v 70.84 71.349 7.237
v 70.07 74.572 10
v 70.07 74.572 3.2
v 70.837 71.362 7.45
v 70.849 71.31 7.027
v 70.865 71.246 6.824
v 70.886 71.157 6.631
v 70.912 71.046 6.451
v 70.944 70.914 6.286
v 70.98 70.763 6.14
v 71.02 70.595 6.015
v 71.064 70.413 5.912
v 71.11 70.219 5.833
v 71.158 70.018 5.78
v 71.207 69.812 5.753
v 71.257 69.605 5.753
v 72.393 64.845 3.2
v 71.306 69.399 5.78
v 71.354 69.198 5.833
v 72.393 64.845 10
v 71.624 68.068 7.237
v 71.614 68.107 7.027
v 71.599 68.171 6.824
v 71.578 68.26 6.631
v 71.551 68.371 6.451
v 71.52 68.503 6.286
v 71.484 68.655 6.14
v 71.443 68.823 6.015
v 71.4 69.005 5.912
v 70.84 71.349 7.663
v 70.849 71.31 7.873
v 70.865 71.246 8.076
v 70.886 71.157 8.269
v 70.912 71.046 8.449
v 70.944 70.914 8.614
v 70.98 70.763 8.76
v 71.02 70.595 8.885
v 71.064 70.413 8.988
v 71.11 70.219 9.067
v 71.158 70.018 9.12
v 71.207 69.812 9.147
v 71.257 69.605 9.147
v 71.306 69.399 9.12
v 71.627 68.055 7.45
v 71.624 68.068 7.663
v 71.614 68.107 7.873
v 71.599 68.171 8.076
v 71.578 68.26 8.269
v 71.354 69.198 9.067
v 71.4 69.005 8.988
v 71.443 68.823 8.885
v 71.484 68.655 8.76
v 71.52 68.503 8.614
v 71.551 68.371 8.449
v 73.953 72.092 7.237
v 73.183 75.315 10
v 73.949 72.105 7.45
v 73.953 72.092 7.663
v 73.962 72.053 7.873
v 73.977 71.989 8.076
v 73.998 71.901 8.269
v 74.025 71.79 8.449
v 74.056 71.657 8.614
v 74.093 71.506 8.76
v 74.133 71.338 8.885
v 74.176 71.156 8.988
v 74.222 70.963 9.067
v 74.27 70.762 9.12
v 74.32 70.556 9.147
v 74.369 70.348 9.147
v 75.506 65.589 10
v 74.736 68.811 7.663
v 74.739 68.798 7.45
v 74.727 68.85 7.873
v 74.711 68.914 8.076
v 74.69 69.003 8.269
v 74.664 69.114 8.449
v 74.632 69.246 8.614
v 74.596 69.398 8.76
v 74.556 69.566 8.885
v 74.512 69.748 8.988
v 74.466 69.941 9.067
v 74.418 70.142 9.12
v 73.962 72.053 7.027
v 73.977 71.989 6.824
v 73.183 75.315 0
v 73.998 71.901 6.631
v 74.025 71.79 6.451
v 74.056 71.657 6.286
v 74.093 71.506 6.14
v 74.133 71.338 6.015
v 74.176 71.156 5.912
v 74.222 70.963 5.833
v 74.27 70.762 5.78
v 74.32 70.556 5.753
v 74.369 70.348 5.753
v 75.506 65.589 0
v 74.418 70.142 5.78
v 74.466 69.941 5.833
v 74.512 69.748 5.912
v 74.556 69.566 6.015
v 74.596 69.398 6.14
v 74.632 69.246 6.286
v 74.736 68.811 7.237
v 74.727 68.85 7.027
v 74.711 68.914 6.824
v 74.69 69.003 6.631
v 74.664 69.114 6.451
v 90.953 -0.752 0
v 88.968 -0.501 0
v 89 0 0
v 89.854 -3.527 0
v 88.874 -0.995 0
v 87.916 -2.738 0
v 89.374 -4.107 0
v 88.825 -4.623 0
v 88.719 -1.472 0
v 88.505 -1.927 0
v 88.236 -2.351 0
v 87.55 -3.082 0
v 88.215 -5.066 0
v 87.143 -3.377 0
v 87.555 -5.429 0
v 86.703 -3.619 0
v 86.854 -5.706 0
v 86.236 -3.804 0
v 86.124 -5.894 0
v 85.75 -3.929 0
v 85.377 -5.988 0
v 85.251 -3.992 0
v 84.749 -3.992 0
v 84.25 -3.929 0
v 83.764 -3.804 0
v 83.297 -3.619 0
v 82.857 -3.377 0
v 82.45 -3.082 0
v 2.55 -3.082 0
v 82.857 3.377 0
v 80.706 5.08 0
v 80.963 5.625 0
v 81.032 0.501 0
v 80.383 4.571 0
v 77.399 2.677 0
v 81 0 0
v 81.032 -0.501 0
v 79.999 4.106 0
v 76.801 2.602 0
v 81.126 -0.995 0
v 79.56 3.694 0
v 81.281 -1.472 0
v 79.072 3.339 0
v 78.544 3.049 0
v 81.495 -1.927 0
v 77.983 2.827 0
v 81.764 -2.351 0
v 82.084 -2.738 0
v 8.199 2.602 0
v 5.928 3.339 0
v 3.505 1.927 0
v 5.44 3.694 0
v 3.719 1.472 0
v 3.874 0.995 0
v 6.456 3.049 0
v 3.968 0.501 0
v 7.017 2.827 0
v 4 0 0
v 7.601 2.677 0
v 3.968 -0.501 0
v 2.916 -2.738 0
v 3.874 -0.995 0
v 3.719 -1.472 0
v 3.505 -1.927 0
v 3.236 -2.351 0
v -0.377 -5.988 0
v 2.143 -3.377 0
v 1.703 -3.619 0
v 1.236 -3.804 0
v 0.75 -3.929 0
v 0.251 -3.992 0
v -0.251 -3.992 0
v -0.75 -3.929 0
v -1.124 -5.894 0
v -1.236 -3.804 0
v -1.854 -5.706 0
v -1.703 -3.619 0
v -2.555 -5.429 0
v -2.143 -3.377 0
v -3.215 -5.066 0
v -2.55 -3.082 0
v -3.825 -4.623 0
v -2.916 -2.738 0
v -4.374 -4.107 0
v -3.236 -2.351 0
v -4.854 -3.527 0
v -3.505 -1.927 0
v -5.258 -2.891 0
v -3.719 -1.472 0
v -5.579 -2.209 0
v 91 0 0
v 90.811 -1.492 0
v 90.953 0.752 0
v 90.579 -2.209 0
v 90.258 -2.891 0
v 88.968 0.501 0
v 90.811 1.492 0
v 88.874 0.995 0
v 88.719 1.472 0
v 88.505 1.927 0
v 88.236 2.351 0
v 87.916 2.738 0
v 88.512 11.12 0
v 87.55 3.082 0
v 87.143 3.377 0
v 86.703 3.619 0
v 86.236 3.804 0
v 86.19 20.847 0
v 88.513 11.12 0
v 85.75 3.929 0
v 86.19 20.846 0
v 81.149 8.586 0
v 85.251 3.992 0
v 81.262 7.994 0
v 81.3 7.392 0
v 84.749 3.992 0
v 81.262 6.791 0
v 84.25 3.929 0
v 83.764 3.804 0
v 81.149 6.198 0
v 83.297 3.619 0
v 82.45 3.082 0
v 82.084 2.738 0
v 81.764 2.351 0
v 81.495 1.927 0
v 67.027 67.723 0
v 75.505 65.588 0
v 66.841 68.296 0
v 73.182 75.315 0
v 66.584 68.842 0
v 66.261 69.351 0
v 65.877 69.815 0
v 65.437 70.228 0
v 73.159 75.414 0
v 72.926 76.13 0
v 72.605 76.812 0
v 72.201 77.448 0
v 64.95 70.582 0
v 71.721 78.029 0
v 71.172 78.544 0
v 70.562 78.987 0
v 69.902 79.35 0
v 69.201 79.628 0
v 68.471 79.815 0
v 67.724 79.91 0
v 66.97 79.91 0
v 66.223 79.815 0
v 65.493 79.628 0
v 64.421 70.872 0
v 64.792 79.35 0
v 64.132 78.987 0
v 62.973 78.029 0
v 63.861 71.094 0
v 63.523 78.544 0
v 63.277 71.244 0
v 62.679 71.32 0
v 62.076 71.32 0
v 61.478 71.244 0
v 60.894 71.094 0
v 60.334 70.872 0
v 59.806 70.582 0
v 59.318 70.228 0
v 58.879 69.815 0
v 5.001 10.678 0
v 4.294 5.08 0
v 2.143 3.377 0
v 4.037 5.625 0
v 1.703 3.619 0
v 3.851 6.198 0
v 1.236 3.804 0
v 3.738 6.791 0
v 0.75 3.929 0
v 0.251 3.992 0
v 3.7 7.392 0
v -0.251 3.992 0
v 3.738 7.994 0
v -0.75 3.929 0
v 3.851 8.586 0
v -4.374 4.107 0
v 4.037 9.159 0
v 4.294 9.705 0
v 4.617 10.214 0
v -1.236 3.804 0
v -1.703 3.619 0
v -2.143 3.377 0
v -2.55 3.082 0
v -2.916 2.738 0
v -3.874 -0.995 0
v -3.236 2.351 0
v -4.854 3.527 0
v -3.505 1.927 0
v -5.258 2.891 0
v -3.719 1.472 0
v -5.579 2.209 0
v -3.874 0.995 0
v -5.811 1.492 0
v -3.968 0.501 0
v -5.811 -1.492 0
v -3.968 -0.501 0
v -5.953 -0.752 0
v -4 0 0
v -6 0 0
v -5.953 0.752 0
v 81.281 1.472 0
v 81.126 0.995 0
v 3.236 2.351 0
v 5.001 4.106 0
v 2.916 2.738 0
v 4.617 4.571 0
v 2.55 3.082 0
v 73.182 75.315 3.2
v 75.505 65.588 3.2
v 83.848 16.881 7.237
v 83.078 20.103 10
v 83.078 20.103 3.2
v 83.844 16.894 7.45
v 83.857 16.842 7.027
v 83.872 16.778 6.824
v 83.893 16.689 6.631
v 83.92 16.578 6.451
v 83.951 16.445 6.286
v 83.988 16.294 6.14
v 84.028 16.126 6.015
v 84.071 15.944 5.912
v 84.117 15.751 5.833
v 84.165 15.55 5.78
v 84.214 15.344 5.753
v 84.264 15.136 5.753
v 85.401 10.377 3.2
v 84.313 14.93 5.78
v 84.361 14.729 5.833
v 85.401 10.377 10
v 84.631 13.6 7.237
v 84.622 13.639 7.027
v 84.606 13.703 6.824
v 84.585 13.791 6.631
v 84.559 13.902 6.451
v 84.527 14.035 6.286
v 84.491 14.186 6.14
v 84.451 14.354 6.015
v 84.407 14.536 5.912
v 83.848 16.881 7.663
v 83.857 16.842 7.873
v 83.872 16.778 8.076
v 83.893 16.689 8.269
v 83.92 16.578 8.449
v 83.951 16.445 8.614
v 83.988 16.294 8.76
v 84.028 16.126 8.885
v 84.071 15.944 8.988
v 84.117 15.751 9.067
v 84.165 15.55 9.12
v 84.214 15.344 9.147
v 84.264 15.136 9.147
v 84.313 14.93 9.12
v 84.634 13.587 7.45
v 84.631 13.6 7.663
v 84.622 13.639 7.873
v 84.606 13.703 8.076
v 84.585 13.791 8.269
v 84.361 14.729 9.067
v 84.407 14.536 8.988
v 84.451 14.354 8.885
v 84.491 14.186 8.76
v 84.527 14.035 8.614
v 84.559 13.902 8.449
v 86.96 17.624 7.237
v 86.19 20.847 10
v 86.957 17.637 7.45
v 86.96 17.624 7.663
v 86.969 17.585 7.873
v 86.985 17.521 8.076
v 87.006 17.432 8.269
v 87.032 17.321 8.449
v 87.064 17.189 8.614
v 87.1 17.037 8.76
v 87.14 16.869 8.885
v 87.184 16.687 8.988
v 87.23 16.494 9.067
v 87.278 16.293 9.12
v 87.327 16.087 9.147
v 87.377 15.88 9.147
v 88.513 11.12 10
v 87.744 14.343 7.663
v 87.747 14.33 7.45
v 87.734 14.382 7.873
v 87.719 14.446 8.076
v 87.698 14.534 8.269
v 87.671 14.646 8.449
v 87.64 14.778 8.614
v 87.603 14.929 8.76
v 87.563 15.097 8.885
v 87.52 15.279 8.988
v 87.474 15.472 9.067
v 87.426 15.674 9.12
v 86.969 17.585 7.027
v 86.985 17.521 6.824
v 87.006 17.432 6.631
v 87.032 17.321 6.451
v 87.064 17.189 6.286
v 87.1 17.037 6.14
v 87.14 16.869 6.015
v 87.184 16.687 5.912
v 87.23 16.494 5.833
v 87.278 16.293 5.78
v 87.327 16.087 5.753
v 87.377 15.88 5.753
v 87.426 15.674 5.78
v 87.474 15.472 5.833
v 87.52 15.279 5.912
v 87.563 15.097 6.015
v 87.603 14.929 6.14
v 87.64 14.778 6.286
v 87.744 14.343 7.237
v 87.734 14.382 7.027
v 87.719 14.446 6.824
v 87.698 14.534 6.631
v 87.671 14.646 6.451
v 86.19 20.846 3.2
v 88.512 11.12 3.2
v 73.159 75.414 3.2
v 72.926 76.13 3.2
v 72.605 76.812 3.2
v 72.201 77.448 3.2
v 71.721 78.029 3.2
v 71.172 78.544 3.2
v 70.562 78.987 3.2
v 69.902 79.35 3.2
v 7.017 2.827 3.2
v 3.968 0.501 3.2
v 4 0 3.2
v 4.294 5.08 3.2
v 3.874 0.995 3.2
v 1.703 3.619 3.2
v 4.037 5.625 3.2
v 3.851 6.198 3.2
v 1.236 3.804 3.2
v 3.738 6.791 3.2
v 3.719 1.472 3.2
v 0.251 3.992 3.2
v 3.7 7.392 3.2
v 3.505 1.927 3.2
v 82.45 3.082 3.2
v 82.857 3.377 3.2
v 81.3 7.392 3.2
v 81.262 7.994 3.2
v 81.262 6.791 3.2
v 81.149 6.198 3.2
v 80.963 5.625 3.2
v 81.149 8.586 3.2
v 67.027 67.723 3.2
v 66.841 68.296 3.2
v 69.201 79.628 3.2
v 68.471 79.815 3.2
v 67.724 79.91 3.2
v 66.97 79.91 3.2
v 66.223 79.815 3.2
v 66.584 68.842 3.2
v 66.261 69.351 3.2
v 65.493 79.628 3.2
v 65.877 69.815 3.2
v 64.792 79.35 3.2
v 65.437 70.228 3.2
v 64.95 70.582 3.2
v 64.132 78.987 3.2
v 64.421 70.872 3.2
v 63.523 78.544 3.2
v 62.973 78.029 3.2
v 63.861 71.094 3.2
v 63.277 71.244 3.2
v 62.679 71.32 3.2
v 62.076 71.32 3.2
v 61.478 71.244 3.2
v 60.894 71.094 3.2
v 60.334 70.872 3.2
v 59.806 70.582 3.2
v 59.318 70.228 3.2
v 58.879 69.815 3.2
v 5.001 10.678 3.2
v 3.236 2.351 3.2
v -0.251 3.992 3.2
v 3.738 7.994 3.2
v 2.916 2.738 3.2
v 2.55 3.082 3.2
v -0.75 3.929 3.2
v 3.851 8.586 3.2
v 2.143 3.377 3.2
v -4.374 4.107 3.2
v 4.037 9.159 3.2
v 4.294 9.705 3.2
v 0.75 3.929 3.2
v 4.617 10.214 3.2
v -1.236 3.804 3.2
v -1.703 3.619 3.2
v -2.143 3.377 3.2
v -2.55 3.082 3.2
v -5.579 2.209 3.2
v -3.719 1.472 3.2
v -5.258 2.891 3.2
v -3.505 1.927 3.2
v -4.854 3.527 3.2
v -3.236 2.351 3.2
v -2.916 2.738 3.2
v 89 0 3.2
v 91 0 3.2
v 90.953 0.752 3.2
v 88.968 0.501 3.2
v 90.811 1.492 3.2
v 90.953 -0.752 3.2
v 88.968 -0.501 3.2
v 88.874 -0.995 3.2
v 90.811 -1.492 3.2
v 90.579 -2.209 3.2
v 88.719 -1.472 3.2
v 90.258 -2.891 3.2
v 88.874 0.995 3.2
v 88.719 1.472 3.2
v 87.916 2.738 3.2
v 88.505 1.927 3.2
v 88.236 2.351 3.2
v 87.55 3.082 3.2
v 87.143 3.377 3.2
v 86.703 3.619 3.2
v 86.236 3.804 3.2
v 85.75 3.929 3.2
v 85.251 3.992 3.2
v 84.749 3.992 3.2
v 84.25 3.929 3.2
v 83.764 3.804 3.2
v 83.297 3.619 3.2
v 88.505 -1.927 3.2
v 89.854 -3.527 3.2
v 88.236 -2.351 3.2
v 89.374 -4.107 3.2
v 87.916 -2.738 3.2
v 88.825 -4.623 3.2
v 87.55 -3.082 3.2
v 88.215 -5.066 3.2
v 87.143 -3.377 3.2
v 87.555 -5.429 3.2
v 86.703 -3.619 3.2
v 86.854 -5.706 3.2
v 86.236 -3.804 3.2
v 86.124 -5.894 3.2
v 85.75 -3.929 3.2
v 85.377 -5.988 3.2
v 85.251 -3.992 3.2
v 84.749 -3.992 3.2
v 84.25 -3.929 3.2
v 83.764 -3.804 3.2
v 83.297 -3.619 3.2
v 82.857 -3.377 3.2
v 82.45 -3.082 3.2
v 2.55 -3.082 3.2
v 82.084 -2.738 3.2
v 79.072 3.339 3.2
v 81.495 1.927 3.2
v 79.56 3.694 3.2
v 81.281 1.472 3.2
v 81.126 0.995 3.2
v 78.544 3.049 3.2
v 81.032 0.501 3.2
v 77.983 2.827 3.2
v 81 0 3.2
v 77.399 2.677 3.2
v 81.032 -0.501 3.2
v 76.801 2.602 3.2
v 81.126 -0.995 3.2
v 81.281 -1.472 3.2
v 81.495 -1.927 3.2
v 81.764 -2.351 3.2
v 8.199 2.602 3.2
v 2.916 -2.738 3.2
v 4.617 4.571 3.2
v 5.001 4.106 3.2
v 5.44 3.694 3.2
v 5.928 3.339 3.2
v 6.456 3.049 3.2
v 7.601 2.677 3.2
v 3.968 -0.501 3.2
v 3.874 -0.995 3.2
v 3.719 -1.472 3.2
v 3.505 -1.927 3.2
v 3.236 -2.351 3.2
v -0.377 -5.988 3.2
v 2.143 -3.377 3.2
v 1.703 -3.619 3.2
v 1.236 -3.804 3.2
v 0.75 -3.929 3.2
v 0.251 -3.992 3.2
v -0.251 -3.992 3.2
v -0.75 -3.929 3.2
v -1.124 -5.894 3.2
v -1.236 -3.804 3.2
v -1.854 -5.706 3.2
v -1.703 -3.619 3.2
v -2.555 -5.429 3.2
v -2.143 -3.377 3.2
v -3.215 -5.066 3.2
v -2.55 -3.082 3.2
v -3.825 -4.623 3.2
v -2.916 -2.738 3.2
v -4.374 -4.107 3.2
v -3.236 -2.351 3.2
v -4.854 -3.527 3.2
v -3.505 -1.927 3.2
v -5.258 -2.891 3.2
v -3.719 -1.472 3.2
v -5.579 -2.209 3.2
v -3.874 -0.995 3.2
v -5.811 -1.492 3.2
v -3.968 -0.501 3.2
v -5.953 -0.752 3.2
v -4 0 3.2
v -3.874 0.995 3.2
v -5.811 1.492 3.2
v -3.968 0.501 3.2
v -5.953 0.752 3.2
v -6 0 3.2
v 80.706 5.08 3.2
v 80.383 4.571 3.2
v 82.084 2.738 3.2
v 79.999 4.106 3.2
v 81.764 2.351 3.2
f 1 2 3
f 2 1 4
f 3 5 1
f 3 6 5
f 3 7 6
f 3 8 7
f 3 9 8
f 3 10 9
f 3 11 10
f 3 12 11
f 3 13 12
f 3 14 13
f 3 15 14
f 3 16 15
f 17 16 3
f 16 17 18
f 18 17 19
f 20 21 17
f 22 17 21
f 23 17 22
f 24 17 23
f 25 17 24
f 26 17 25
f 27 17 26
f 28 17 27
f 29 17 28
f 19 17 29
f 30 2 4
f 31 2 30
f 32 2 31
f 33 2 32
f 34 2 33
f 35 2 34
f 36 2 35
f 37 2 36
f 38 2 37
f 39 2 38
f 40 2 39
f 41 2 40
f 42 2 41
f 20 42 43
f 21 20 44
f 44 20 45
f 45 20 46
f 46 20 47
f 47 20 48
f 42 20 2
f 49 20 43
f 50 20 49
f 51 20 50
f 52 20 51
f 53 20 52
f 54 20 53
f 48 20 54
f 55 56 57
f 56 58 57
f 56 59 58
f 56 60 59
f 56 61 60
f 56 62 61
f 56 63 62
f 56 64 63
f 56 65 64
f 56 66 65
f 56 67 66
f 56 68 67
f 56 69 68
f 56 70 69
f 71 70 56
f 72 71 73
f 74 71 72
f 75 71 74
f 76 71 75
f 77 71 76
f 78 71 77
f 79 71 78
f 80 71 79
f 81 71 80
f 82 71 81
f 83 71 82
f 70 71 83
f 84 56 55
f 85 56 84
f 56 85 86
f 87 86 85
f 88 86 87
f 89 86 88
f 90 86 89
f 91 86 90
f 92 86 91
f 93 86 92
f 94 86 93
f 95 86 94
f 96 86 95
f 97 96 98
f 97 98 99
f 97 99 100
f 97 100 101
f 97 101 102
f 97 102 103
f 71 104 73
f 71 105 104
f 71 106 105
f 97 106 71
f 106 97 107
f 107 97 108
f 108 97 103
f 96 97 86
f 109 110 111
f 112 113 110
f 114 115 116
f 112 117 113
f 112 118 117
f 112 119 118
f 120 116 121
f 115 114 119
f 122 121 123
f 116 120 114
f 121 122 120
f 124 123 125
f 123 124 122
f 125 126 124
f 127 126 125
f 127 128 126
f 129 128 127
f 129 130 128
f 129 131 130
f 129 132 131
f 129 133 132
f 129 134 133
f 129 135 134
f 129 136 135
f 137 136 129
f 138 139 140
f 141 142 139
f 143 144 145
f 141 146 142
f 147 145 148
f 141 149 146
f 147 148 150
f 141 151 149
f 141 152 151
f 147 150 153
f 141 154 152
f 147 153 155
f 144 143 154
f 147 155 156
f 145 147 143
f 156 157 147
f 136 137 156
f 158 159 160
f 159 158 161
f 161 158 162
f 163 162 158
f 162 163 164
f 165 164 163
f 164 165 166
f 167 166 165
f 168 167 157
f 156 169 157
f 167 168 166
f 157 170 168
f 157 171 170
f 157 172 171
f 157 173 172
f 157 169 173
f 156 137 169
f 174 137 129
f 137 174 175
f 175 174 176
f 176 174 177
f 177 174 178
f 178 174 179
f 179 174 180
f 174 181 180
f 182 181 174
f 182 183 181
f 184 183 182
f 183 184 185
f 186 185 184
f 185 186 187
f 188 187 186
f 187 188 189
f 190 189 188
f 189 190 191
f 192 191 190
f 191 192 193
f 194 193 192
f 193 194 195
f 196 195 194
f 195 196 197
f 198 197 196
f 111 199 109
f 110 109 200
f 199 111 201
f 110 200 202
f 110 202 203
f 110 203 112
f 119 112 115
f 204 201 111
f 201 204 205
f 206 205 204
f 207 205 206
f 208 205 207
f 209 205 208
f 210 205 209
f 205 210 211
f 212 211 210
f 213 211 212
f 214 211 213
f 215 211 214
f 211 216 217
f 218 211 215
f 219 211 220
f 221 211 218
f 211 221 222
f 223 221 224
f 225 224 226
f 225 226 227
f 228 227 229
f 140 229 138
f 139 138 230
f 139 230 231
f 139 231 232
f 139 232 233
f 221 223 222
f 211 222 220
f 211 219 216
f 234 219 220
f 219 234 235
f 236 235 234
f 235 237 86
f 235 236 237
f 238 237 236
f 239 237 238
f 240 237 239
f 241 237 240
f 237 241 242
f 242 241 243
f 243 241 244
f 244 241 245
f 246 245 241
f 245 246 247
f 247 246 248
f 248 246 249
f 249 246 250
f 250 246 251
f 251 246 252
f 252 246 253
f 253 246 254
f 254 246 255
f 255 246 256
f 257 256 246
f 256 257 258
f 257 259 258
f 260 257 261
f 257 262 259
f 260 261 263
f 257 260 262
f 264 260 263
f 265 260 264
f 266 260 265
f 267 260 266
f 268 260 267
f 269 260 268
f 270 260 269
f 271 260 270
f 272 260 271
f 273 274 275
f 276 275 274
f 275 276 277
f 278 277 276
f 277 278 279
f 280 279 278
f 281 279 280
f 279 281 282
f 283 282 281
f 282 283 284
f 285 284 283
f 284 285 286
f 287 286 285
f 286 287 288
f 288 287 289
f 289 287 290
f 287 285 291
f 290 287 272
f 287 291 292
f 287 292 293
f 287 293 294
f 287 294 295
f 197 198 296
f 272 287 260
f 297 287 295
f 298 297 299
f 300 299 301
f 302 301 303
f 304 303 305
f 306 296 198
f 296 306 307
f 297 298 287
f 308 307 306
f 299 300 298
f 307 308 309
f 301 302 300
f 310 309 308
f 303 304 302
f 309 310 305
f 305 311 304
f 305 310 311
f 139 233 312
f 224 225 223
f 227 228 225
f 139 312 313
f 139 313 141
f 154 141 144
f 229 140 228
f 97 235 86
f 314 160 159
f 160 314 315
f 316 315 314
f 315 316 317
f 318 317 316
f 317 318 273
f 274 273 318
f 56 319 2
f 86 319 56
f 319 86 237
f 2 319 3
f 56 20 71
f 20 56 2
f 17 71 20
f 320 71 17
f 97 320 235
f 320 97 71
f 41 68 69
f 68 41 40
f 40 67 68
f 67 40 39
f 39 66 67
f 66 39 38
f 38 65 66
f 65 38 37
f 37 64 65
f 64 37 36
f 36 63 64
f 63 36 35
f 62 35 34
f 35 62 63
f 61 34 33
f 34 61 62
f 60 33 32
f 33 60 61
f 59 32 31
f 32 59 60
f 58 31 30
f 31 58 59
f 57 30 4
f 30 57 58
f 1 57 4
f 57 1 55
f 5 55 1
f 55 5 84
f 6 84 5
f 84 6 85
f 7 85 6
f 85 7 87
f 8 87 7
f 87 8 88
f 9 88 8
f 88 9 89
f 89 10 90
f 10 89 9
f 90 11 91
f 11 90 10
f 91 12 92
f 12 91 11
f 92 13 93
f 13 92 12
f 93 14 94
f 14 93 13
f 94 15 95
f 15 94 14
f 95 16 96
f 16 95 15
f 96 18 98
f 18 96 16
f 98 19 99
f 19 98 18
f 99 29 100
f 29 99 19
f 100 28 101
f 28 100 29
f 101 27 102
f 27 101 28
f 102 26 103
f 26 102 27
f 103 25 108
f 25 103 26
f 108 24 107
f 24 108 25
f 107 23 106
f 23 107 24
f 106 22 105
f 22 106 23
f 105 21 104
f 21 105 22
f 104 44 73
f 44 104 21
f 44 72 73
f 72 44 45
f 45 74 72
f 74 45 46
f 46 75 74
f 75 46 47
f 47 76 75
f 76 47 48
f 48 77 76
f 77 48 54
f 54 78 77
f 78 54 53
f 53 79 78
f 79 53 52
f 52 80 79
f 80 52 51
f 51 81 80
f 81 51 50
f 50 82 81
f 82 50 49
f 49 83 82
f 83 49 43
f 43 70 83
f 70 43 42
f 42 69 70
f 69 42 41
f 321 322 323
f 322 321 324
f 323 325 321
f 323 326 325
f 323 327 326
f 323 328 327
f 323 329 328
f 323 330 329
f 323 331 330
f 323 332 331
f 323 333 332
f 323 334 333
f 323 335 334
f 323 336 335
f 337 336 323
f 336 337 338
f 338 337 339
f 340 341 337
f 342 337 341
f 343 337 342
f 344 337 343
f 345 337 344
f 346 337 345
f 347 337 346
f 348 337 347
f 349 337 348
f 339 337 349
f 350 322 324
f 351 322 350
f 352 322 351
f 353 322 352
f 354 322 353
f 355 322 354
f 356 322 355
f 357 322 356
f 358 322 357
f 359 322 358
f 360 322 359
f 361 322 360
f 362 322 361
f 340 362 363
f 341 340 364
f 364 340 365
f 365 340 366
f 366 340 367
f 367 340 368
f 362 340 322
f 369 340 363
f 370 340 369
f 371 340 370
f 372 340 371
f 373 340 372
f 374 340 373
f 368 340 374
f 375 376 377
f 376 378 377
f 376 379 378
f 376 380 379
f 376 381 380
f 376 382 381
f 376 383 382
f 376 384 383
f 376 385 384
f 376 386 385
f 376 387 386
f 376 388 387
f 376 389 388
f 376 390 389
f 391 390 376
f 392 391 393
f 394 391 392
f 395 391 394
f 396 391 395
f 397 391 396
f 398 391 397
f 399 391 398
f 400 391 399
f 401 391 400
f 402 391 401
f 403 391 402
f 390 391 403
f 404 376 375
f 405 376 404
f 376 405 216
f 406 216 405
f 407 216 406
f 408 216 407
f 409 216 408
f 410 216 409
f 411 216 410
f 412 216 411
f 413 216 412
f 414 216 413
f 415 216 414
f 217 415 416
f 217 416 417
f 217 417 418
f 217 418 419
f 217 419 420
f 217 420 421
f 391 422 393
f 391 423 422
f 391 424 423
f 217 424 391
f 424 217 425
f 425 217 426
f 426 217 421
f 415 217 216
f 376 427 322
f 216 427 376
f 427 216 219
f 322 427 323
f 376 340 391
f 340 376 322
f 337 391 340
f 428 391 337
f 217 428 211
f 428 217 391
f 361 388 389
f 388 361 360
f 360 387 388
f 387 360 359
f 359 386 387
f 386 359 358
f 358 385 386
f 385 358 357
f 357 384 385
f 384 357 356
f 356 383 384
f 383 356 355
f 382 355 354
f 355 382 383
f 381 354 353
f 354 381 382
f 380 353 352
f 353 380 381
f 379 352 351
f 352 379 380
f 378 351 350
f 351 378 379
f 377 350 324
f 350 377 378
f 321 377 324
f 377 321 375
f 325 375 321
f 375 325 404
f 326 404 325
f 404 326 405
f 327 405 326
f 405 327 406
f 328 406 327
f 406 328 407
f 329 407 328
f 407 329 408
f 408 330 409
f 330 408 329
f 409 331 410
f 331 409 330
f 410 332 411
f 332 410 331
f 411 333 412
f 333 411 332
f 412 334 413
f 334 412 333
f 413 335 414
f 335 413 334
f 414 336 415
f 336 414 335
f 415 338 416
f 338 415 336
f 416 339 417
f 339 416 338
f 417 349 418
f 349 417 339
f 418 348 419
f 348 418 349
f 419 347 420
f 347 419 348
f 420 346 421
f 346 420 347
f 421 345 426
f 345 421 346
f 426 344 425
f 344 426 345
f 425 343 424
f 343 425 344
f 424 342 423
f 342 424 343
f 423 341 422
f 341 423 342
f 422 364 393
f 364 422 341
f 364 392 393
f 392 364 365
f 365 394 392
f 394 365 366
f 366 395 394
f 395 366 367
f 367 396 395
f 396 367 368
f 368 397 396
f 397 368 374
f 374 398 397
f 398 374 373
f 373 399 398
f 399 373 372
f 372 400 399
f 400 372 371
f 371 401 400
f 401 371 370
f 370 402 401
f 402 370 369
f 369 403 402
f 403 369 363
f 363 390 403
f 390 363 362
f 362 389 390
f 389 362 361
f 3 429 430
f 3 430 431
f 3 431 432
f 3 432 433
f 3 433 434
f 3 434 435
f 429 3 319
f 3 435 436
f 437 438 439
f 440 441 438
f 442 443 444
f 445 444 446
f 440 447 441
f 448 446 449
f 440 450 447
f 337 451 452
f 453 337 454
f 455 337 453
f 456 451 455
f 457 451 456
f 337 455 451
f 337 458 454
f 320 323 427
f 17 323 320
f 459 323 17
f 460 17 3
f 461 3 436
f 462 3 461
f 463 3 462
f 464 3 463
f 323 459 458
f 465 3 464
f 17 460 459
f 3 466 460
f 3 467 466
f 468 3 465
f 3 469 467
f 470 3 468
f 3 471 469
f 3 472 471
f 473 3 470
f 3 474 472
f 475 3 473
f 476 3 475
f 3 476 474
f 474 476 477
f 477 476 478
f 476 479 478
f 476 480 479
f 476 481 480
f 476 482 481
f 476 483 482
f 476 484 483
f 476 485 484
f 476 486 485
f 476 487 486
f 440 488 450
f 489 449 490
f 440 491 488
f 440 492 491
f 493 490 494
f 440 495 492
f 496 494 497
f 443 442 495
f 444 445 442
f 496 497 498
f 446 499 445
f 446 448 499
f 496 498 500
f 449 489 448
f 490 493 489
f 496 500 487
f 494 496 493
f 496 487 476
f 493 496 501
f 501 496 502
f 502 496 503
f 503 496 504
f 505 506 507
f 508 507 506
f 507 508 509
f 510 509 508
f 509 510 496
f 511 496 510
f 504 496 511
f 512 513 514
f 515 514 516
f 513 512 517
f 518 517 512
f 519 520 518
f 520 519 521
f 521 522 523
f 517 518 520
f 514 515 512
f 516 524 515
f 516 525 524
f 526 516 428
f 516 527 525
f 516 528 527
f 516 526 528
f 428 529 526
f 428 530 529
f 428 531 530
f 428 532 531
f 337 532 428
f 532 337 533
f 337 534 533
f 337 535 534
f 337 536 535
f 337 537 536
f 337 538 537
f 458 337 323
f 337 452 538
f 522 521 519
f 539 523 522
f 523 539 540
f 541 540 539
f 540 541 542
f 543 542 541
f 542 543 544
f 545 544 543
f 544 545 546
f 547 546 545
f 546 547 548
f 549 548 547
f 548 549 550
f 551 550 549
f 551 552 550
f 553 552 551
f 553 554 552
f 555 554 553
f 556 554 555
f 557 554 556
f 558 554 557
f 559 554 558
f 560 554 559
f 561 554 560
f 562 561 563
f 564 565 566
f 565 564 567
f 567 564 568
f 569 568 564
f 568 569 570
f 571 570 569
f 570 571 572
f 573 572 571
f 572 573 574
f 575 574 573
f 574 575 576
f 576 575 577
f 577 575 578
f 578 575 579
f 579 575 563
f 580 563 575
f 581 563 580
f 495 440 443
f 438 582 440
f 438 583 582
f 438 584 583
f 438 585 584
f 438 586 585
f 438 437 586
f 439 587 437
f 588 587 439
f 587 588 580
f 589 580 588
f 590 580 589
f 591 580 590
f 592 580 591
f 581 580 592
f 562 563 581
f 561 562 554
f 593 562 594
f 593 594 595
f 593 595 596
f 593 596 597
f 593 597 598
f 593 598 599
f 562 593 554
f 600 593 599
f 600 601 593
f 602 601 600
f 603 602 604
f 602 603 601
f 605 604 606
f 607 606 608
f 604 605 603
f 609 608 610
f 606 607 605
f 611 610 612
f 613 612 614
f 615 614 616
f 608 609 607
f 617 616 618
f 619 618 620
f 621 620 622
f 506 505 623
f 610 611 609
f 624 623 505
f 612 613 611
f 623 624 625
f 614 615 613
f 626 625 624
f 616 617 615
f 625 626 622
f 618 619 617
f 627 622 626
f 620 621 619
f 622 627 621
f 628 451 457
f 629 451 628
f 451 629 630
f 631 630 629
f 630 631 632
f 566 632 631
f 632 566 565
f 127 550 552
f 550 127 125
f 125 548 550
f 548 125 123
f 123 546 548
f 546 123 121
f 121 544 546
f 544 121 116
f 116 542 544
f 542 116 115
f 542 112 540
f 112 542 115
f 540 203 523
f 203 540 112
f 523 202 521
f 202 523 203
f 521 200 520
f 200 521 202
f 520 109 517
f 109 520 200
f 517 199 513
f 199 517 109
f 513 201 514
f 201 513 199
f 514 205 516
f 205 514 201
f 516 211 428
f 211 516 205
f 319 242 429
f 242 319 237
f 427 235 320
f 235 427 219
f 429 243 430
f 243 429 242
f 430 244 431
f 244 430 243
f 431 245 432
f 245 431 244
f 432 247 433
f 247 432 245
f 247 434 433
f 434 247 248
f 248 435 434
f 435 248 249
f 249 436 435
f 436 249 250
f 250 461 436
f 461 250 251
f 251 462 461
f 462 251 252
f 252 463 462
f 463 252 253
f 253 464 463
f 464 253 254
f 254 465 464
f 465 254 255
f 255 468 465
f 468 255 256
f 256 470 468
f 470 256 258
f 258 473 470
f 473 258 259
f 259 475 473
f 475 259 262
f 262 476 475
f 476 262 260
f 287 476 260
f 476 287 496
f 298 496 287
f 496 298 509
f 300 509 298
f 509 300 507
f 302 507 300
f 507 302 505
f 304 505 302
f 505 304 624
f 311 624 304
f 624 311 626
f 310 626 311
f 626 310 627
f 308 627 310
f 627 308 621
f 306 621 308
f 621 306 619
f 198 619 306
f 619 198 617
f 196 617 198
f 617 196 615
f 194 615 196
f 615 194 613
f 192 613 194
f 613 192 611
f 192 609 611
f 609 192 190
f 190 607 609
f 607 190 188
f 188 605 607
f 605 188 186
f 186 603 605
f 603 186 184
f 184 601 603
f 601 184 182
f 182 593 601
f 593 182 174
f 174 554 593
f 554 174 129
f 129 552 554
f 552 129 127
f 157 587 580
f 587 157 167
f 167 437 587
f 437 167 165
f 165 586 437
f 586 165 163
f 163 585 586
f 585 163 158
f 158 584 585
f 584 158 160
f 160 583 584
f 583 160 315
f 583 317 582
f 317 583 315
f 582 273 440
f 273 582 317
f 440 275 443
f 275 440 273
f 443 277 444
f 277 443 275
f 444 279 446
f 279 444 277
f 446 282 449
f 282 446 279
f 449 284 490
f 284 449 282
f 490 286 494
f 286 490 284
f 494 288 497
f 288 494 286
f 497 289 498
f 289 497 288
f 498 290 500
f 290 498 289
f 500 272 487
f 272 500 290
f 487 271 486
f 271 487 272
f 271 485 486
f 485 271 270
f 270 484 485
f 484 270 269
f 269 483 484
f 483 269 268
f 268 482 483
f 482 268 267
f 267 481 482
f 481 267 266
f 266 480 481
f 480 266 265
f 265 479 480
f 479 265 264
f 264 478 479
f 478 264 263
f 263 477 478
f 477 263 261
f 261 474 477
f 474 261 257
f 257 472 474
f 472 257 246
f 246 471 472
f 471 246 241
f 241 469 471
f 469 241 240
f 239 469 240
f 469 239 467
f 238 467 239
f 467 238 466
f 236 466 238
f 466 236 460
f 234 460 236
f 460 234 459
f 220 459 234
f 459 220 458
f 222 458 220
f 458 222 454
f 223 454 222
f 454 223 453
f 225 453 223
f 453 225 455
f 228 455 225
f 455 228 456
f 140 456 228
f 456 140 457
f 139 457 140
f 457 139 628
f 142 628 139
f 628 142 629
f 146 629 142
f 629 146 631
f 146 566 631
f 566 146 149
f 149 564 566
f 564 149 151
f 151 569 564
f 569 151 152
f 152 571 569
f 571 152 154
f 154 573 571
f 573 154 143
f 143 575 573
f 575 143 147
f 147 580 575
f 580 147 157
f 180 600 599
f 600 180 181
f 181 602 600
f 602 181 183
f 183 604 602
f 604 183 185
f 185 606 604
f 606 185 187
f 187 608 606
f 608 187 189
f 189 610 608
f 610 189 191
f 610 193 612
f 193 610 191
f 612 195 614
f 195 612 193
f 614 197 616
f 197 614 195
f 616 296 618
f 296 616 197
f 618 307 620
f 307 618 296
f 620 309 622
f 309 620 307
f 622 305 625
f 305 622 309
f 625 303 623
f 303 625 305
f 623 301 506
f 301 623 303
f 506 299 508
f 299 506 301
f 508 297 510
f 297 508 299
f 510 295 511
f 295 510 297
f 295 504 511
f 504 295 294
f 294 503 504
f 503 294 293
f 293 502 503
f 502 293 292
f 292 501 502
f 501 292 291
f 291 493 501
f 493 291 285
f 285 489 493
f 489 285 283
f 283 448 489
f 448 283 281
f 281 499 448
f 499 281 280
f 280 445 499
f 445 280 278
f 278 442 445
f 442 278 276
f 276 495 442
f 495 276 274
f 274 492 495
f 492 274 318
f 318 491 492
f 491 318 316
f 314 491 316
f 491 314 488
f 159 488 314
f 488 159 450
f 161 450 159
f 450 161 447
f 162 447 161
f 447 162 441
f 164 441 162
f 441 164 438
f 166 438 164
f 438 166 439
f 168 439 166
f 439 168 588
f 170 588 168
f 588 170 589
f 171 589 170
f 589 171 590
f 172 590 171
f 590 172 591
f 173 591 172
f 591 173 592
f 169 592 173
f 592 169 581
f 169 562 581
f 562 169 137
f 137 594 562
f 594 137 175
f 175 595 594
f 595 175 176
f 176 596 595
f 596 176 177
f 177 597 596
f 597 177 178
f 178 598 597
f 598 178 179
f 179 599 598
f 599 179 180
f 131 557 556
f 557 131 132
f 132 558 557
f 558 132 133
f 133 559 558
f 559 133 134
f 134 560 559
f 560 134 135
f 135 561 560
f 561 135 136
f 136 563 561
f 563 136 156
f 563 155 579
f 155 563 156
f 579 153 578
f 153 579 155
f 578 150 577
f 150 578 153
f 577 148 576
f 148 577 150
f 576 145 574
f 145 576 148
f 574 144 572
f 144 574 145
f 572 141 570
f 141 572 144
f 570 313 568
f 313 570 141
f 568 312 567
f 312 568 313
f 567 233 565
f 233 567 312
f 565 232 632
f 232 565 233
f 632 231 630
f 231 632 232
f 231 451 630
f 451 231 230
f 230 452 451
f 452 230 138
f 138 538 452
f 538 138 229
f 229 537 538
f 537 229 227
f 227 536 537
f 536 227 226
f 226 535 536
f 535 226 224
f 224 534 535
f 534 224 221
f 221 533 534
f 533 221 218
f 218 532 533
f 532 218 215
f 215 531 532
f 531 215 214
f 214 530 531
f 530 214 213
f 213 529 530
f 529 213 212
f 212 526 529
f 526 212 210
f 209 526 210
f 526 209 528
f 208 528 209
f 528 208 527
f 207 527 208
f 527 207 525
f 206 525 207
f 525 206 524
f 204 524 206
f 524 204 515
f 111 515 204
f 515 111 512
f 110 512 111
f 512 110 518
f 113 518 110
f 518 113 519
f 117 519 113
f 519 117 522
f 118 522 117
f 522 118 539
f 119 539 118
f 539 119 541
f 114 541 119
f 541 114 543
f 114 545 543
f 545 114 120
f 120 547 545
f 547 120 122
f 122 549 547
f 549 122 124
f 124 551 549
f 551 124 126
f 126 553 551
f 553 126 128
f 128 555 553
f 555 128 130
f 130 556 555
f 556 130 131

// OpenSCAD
$fn = 50;

r1 = 8/2; // big mounting holes
r2 = 3.4/2; // PCB mounting hols
a = 85; // distance between large mounting holes (centers)
b = 100; // lift arm of the bracket, sets the angle of the bracket
d = 56; // distance between PCB mounting holes (centers)
c = d+20; // extra size for the PCB mount part of the bracket

tab_size = 10;  // square tab size

thickness = 3.2; // thickness of the bracket and tabs
sc = 0.8; // center removal scale factor
mink = 1.5; // r1*mink(owski) produces the rounded edges and the hole material

union()
{
	linear_extrude(height = thickness) difference()
	{
		minkowski()
		{
			polygon(points = [[0,0], [a,0], [b*cos(acos((pow(a,2)+pow(b,2)-pow(c,2))/(2*a*b))), b*sin(acos((pow(a,2)+pow(b,2)-pow(c,2))/(2*a*b)))]], paths = [[0,1,2,0]]);
			circle(r = mink*r1);
		}

		circle(r = r1);
		translate([a,0]) circle(r = r1);
		
		translate([a/2-(a/2)*sc,b*sin(acos((pow(a,2)+pow(b,2)-pow(c,2))/(2*a*b)))/2-(b*sin(acos((pow(a,2)+pow(b,2)-pow(c,2))/(2*a*b)))/2)*sc]) scale(v = [sc,sc]) minkowski()
		{
			polygon(points = [[0,0], [a,0], [b*cos(acos((pow(a,2)+pow(b,2)-pow(c,2))/(2*a*b))), b*sin(acos((pow(a,2)+pow(b,2)-pow(c,2))/(2*a*b)))]], paths = [[0,1,2,0]]);
			circle(r = mink*r1);
		}
	}

	//translate([tab_size/2+mink*r1, tab_size/2+mink*r1,0])
	translate([b*cos(acos((pow(a,2)+pow(b,2)-pow(c,2))/(2*a*b))), b*sin(acos((pow(a,2)+pow(b,2)-pow(c,2))/(2*a*b)))]) rotate([0,0,-acos((pow(a,2)+pow(c,2)-pow(b,2))/(2*a*c))]) translate([tab_size/2, mink*r1-thickness, tab_size/2]) rotate([-90,0,0]) union()
	{
		linear_extrude(height = thickness) difference()
		{
			square([tab_size, tab_size], center = true);
			translate([0,-tab_size/2+r2*mink]) circle(r = r2);
		}

		translate([d,0]) linear_extrude(height = thickness) difference()
		{
			square([tab_size, tab_size], center = true);
			translate([0,-tab_size/2+r2*mink]) circle(r = r2);
		}
	}
}
